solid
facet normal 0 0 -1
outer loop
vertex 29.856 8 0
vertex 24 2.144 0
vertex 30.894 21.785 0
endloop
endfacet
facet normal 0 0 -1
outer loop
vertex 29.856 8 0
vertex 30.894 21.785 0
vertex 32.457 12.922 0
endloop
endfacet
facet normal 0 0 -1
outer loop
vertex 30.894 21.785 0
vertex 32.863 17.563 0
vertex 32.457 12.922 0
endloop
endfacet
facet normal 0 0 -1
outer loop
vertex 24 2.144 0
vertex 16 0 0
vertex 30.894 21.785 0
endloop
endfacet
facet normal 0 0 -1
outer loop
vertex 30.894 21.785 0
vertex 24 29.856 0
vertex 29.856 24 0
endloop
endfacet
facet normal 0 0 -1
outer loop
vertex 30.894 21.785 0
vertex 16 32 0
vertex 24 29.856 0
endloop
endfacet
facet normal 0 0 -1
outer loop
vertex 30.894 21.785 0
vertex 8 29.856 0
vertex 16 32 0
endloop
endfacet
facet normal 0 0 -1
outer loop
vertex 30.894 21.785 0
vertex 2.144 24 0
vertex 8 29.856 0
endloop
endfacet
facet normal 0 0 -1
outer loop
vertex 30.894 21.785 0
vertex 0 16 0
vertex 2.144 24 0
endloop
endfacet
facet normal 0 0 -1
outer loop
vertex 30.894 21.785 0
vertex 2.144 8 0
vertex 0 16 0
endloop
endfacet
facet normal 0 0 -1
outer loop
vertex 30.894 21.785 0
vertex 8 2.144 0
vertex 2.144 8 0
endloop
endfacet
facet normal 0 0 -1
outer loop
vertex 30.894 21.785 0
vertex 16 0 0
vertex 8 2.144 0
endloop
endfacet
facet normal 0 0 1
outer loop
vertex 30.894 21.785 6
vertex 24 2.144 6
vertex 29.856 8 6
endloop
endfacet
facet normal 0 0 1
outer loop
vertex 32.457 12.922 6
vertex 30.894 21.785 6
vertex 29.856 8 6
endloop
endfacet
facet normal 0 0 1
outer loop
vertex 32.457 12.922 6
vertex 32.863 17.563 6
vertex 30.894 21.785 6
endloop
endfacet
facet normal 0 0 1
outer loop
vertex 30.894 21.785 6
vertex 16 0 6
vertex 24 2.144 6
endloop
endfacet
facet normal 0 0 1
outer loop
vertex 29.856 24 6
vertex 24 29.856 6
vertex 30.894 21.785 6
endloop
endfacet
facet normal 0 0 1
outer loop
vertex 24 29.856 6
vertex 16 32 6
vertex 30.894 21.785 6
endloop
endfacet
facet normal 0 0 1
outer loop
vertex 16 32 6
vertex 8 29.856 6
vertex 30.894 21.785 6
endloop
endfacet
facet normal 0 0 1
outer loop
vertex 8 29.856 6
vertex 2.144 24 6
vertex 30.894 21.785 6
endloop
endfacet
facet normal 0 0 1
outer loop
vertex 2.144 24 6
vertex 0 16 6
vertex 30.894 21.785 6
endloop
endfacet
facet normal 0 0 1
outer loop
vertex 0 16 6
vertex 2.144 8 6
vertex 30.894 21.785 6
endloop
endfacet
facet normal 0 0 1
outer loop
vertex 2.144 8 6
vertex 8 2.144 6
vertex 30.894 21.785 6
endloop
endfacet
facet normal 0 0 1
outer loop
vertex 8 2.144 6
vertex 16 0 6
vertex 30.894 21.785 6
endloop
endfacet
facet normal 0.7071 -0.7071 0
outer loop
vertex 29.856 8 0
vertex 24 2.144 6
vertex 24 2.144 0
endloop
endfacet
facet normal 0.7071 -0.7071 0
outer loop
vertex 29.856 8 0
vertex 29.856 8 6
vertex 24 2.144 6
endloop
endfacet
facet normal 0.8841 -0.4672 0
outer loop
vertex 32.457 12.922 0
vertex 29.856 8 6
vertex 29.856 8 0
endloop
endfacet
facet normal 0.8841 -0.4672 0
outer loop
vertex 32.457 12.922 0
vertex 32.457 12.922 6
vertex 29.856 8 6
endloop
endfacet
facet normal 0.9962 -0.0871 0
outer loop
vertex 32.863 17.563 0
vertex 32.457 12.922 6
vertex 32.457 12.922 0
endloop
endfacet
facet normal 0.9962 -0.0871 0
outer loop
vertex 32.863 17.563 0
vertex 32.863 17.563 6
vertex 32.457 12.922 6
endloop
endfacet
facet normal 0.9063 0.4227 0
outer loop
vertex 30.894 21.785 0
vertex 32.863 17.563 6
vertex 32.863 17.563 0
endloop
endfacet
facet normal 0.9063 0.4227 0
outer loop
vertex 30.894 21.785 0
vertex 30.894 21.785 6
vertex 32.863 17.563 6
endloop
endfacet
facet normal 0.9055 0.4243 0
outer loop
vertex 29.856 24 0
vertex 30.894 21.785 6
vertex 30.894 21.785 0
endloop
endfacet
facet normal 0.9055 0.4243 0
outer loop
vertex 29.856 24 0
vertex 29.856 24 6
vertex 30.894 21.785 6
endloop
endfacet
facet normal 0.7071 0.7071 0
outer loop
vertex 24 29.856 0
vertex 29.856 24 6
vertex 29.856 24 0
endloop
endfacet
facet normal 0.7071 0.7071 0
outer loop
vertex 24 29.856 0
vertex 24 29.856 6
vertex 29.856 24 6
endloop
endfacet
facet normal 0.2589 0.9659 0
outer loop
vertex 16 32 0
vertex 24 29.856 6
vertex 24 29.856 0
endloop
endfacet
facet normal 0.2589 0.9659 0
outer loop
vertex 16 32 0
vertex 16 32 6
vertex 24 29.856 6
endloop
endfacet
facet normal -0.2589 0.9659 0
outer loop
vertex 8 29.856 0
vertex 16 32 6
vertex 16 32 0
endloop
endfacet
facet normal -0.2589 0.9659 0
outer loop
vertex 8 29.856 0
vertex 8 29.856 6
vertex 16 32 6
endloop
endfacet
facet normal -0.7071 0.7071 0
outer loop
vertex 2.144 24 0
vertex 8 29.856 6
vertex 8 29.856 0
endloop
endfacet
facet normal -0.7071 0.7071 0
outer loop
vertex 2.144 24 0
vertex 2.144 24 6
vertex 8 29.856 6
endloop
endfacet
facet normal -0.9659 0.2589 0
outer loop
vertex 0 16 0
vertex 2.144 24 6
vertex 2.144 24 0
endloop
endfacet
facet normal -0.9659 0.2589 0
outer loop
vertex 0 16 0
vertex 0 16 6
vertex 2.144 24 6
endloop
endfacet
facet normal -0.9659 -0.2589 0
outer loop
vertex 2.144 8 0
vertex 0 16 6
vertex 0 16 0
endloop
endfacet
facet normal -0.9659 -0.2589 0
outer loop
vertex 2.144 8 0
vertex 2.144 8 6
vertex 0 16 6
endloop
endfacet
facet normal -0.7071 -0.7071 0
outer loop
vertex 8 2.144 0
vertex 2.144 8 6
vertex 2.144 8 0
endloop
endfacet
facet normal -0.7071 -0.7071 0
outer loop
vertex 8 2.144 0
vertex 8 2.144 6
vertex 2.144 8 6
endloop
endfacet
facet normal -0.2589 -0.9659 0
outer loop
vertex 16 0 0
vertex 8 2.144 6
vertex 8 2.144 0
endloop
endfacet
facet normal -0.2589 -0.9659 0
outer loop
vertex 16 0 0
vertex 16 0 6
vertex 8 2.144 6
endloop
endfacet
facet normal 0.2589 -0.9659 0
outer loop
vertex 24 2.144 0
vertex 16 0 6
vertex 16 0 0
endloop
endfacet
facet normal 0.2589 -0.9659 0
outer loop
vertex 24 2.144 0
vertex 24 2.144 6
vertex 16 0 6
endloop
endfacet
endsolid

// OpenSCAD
$fn = 32;

// ----------------------------------------------------------------------
// Eccentric disc: egg, 6 mm thick
// ----------------------------------------------------------------------

// --- parameters (mm) ---
profile_height = 6;       // extrusion height
profile_points = 14;      // points of the closed outline

profile = [[0, 16], [2.144, 8], [8, 2.144], [16, 0], [24, 2.144], [29.856, 8], [32.457, 12.922], [32.863, 17.563], [30.894, 21.785], [29.856, 24], [24, 29.856], [16, 32], [8, 29.856], [2.144, 24]];  // single closed polygon, 14 points, counter clockwise

// --- the one profile operation ---
linear_extrude(height = profile_height) polygon(points = profile);
